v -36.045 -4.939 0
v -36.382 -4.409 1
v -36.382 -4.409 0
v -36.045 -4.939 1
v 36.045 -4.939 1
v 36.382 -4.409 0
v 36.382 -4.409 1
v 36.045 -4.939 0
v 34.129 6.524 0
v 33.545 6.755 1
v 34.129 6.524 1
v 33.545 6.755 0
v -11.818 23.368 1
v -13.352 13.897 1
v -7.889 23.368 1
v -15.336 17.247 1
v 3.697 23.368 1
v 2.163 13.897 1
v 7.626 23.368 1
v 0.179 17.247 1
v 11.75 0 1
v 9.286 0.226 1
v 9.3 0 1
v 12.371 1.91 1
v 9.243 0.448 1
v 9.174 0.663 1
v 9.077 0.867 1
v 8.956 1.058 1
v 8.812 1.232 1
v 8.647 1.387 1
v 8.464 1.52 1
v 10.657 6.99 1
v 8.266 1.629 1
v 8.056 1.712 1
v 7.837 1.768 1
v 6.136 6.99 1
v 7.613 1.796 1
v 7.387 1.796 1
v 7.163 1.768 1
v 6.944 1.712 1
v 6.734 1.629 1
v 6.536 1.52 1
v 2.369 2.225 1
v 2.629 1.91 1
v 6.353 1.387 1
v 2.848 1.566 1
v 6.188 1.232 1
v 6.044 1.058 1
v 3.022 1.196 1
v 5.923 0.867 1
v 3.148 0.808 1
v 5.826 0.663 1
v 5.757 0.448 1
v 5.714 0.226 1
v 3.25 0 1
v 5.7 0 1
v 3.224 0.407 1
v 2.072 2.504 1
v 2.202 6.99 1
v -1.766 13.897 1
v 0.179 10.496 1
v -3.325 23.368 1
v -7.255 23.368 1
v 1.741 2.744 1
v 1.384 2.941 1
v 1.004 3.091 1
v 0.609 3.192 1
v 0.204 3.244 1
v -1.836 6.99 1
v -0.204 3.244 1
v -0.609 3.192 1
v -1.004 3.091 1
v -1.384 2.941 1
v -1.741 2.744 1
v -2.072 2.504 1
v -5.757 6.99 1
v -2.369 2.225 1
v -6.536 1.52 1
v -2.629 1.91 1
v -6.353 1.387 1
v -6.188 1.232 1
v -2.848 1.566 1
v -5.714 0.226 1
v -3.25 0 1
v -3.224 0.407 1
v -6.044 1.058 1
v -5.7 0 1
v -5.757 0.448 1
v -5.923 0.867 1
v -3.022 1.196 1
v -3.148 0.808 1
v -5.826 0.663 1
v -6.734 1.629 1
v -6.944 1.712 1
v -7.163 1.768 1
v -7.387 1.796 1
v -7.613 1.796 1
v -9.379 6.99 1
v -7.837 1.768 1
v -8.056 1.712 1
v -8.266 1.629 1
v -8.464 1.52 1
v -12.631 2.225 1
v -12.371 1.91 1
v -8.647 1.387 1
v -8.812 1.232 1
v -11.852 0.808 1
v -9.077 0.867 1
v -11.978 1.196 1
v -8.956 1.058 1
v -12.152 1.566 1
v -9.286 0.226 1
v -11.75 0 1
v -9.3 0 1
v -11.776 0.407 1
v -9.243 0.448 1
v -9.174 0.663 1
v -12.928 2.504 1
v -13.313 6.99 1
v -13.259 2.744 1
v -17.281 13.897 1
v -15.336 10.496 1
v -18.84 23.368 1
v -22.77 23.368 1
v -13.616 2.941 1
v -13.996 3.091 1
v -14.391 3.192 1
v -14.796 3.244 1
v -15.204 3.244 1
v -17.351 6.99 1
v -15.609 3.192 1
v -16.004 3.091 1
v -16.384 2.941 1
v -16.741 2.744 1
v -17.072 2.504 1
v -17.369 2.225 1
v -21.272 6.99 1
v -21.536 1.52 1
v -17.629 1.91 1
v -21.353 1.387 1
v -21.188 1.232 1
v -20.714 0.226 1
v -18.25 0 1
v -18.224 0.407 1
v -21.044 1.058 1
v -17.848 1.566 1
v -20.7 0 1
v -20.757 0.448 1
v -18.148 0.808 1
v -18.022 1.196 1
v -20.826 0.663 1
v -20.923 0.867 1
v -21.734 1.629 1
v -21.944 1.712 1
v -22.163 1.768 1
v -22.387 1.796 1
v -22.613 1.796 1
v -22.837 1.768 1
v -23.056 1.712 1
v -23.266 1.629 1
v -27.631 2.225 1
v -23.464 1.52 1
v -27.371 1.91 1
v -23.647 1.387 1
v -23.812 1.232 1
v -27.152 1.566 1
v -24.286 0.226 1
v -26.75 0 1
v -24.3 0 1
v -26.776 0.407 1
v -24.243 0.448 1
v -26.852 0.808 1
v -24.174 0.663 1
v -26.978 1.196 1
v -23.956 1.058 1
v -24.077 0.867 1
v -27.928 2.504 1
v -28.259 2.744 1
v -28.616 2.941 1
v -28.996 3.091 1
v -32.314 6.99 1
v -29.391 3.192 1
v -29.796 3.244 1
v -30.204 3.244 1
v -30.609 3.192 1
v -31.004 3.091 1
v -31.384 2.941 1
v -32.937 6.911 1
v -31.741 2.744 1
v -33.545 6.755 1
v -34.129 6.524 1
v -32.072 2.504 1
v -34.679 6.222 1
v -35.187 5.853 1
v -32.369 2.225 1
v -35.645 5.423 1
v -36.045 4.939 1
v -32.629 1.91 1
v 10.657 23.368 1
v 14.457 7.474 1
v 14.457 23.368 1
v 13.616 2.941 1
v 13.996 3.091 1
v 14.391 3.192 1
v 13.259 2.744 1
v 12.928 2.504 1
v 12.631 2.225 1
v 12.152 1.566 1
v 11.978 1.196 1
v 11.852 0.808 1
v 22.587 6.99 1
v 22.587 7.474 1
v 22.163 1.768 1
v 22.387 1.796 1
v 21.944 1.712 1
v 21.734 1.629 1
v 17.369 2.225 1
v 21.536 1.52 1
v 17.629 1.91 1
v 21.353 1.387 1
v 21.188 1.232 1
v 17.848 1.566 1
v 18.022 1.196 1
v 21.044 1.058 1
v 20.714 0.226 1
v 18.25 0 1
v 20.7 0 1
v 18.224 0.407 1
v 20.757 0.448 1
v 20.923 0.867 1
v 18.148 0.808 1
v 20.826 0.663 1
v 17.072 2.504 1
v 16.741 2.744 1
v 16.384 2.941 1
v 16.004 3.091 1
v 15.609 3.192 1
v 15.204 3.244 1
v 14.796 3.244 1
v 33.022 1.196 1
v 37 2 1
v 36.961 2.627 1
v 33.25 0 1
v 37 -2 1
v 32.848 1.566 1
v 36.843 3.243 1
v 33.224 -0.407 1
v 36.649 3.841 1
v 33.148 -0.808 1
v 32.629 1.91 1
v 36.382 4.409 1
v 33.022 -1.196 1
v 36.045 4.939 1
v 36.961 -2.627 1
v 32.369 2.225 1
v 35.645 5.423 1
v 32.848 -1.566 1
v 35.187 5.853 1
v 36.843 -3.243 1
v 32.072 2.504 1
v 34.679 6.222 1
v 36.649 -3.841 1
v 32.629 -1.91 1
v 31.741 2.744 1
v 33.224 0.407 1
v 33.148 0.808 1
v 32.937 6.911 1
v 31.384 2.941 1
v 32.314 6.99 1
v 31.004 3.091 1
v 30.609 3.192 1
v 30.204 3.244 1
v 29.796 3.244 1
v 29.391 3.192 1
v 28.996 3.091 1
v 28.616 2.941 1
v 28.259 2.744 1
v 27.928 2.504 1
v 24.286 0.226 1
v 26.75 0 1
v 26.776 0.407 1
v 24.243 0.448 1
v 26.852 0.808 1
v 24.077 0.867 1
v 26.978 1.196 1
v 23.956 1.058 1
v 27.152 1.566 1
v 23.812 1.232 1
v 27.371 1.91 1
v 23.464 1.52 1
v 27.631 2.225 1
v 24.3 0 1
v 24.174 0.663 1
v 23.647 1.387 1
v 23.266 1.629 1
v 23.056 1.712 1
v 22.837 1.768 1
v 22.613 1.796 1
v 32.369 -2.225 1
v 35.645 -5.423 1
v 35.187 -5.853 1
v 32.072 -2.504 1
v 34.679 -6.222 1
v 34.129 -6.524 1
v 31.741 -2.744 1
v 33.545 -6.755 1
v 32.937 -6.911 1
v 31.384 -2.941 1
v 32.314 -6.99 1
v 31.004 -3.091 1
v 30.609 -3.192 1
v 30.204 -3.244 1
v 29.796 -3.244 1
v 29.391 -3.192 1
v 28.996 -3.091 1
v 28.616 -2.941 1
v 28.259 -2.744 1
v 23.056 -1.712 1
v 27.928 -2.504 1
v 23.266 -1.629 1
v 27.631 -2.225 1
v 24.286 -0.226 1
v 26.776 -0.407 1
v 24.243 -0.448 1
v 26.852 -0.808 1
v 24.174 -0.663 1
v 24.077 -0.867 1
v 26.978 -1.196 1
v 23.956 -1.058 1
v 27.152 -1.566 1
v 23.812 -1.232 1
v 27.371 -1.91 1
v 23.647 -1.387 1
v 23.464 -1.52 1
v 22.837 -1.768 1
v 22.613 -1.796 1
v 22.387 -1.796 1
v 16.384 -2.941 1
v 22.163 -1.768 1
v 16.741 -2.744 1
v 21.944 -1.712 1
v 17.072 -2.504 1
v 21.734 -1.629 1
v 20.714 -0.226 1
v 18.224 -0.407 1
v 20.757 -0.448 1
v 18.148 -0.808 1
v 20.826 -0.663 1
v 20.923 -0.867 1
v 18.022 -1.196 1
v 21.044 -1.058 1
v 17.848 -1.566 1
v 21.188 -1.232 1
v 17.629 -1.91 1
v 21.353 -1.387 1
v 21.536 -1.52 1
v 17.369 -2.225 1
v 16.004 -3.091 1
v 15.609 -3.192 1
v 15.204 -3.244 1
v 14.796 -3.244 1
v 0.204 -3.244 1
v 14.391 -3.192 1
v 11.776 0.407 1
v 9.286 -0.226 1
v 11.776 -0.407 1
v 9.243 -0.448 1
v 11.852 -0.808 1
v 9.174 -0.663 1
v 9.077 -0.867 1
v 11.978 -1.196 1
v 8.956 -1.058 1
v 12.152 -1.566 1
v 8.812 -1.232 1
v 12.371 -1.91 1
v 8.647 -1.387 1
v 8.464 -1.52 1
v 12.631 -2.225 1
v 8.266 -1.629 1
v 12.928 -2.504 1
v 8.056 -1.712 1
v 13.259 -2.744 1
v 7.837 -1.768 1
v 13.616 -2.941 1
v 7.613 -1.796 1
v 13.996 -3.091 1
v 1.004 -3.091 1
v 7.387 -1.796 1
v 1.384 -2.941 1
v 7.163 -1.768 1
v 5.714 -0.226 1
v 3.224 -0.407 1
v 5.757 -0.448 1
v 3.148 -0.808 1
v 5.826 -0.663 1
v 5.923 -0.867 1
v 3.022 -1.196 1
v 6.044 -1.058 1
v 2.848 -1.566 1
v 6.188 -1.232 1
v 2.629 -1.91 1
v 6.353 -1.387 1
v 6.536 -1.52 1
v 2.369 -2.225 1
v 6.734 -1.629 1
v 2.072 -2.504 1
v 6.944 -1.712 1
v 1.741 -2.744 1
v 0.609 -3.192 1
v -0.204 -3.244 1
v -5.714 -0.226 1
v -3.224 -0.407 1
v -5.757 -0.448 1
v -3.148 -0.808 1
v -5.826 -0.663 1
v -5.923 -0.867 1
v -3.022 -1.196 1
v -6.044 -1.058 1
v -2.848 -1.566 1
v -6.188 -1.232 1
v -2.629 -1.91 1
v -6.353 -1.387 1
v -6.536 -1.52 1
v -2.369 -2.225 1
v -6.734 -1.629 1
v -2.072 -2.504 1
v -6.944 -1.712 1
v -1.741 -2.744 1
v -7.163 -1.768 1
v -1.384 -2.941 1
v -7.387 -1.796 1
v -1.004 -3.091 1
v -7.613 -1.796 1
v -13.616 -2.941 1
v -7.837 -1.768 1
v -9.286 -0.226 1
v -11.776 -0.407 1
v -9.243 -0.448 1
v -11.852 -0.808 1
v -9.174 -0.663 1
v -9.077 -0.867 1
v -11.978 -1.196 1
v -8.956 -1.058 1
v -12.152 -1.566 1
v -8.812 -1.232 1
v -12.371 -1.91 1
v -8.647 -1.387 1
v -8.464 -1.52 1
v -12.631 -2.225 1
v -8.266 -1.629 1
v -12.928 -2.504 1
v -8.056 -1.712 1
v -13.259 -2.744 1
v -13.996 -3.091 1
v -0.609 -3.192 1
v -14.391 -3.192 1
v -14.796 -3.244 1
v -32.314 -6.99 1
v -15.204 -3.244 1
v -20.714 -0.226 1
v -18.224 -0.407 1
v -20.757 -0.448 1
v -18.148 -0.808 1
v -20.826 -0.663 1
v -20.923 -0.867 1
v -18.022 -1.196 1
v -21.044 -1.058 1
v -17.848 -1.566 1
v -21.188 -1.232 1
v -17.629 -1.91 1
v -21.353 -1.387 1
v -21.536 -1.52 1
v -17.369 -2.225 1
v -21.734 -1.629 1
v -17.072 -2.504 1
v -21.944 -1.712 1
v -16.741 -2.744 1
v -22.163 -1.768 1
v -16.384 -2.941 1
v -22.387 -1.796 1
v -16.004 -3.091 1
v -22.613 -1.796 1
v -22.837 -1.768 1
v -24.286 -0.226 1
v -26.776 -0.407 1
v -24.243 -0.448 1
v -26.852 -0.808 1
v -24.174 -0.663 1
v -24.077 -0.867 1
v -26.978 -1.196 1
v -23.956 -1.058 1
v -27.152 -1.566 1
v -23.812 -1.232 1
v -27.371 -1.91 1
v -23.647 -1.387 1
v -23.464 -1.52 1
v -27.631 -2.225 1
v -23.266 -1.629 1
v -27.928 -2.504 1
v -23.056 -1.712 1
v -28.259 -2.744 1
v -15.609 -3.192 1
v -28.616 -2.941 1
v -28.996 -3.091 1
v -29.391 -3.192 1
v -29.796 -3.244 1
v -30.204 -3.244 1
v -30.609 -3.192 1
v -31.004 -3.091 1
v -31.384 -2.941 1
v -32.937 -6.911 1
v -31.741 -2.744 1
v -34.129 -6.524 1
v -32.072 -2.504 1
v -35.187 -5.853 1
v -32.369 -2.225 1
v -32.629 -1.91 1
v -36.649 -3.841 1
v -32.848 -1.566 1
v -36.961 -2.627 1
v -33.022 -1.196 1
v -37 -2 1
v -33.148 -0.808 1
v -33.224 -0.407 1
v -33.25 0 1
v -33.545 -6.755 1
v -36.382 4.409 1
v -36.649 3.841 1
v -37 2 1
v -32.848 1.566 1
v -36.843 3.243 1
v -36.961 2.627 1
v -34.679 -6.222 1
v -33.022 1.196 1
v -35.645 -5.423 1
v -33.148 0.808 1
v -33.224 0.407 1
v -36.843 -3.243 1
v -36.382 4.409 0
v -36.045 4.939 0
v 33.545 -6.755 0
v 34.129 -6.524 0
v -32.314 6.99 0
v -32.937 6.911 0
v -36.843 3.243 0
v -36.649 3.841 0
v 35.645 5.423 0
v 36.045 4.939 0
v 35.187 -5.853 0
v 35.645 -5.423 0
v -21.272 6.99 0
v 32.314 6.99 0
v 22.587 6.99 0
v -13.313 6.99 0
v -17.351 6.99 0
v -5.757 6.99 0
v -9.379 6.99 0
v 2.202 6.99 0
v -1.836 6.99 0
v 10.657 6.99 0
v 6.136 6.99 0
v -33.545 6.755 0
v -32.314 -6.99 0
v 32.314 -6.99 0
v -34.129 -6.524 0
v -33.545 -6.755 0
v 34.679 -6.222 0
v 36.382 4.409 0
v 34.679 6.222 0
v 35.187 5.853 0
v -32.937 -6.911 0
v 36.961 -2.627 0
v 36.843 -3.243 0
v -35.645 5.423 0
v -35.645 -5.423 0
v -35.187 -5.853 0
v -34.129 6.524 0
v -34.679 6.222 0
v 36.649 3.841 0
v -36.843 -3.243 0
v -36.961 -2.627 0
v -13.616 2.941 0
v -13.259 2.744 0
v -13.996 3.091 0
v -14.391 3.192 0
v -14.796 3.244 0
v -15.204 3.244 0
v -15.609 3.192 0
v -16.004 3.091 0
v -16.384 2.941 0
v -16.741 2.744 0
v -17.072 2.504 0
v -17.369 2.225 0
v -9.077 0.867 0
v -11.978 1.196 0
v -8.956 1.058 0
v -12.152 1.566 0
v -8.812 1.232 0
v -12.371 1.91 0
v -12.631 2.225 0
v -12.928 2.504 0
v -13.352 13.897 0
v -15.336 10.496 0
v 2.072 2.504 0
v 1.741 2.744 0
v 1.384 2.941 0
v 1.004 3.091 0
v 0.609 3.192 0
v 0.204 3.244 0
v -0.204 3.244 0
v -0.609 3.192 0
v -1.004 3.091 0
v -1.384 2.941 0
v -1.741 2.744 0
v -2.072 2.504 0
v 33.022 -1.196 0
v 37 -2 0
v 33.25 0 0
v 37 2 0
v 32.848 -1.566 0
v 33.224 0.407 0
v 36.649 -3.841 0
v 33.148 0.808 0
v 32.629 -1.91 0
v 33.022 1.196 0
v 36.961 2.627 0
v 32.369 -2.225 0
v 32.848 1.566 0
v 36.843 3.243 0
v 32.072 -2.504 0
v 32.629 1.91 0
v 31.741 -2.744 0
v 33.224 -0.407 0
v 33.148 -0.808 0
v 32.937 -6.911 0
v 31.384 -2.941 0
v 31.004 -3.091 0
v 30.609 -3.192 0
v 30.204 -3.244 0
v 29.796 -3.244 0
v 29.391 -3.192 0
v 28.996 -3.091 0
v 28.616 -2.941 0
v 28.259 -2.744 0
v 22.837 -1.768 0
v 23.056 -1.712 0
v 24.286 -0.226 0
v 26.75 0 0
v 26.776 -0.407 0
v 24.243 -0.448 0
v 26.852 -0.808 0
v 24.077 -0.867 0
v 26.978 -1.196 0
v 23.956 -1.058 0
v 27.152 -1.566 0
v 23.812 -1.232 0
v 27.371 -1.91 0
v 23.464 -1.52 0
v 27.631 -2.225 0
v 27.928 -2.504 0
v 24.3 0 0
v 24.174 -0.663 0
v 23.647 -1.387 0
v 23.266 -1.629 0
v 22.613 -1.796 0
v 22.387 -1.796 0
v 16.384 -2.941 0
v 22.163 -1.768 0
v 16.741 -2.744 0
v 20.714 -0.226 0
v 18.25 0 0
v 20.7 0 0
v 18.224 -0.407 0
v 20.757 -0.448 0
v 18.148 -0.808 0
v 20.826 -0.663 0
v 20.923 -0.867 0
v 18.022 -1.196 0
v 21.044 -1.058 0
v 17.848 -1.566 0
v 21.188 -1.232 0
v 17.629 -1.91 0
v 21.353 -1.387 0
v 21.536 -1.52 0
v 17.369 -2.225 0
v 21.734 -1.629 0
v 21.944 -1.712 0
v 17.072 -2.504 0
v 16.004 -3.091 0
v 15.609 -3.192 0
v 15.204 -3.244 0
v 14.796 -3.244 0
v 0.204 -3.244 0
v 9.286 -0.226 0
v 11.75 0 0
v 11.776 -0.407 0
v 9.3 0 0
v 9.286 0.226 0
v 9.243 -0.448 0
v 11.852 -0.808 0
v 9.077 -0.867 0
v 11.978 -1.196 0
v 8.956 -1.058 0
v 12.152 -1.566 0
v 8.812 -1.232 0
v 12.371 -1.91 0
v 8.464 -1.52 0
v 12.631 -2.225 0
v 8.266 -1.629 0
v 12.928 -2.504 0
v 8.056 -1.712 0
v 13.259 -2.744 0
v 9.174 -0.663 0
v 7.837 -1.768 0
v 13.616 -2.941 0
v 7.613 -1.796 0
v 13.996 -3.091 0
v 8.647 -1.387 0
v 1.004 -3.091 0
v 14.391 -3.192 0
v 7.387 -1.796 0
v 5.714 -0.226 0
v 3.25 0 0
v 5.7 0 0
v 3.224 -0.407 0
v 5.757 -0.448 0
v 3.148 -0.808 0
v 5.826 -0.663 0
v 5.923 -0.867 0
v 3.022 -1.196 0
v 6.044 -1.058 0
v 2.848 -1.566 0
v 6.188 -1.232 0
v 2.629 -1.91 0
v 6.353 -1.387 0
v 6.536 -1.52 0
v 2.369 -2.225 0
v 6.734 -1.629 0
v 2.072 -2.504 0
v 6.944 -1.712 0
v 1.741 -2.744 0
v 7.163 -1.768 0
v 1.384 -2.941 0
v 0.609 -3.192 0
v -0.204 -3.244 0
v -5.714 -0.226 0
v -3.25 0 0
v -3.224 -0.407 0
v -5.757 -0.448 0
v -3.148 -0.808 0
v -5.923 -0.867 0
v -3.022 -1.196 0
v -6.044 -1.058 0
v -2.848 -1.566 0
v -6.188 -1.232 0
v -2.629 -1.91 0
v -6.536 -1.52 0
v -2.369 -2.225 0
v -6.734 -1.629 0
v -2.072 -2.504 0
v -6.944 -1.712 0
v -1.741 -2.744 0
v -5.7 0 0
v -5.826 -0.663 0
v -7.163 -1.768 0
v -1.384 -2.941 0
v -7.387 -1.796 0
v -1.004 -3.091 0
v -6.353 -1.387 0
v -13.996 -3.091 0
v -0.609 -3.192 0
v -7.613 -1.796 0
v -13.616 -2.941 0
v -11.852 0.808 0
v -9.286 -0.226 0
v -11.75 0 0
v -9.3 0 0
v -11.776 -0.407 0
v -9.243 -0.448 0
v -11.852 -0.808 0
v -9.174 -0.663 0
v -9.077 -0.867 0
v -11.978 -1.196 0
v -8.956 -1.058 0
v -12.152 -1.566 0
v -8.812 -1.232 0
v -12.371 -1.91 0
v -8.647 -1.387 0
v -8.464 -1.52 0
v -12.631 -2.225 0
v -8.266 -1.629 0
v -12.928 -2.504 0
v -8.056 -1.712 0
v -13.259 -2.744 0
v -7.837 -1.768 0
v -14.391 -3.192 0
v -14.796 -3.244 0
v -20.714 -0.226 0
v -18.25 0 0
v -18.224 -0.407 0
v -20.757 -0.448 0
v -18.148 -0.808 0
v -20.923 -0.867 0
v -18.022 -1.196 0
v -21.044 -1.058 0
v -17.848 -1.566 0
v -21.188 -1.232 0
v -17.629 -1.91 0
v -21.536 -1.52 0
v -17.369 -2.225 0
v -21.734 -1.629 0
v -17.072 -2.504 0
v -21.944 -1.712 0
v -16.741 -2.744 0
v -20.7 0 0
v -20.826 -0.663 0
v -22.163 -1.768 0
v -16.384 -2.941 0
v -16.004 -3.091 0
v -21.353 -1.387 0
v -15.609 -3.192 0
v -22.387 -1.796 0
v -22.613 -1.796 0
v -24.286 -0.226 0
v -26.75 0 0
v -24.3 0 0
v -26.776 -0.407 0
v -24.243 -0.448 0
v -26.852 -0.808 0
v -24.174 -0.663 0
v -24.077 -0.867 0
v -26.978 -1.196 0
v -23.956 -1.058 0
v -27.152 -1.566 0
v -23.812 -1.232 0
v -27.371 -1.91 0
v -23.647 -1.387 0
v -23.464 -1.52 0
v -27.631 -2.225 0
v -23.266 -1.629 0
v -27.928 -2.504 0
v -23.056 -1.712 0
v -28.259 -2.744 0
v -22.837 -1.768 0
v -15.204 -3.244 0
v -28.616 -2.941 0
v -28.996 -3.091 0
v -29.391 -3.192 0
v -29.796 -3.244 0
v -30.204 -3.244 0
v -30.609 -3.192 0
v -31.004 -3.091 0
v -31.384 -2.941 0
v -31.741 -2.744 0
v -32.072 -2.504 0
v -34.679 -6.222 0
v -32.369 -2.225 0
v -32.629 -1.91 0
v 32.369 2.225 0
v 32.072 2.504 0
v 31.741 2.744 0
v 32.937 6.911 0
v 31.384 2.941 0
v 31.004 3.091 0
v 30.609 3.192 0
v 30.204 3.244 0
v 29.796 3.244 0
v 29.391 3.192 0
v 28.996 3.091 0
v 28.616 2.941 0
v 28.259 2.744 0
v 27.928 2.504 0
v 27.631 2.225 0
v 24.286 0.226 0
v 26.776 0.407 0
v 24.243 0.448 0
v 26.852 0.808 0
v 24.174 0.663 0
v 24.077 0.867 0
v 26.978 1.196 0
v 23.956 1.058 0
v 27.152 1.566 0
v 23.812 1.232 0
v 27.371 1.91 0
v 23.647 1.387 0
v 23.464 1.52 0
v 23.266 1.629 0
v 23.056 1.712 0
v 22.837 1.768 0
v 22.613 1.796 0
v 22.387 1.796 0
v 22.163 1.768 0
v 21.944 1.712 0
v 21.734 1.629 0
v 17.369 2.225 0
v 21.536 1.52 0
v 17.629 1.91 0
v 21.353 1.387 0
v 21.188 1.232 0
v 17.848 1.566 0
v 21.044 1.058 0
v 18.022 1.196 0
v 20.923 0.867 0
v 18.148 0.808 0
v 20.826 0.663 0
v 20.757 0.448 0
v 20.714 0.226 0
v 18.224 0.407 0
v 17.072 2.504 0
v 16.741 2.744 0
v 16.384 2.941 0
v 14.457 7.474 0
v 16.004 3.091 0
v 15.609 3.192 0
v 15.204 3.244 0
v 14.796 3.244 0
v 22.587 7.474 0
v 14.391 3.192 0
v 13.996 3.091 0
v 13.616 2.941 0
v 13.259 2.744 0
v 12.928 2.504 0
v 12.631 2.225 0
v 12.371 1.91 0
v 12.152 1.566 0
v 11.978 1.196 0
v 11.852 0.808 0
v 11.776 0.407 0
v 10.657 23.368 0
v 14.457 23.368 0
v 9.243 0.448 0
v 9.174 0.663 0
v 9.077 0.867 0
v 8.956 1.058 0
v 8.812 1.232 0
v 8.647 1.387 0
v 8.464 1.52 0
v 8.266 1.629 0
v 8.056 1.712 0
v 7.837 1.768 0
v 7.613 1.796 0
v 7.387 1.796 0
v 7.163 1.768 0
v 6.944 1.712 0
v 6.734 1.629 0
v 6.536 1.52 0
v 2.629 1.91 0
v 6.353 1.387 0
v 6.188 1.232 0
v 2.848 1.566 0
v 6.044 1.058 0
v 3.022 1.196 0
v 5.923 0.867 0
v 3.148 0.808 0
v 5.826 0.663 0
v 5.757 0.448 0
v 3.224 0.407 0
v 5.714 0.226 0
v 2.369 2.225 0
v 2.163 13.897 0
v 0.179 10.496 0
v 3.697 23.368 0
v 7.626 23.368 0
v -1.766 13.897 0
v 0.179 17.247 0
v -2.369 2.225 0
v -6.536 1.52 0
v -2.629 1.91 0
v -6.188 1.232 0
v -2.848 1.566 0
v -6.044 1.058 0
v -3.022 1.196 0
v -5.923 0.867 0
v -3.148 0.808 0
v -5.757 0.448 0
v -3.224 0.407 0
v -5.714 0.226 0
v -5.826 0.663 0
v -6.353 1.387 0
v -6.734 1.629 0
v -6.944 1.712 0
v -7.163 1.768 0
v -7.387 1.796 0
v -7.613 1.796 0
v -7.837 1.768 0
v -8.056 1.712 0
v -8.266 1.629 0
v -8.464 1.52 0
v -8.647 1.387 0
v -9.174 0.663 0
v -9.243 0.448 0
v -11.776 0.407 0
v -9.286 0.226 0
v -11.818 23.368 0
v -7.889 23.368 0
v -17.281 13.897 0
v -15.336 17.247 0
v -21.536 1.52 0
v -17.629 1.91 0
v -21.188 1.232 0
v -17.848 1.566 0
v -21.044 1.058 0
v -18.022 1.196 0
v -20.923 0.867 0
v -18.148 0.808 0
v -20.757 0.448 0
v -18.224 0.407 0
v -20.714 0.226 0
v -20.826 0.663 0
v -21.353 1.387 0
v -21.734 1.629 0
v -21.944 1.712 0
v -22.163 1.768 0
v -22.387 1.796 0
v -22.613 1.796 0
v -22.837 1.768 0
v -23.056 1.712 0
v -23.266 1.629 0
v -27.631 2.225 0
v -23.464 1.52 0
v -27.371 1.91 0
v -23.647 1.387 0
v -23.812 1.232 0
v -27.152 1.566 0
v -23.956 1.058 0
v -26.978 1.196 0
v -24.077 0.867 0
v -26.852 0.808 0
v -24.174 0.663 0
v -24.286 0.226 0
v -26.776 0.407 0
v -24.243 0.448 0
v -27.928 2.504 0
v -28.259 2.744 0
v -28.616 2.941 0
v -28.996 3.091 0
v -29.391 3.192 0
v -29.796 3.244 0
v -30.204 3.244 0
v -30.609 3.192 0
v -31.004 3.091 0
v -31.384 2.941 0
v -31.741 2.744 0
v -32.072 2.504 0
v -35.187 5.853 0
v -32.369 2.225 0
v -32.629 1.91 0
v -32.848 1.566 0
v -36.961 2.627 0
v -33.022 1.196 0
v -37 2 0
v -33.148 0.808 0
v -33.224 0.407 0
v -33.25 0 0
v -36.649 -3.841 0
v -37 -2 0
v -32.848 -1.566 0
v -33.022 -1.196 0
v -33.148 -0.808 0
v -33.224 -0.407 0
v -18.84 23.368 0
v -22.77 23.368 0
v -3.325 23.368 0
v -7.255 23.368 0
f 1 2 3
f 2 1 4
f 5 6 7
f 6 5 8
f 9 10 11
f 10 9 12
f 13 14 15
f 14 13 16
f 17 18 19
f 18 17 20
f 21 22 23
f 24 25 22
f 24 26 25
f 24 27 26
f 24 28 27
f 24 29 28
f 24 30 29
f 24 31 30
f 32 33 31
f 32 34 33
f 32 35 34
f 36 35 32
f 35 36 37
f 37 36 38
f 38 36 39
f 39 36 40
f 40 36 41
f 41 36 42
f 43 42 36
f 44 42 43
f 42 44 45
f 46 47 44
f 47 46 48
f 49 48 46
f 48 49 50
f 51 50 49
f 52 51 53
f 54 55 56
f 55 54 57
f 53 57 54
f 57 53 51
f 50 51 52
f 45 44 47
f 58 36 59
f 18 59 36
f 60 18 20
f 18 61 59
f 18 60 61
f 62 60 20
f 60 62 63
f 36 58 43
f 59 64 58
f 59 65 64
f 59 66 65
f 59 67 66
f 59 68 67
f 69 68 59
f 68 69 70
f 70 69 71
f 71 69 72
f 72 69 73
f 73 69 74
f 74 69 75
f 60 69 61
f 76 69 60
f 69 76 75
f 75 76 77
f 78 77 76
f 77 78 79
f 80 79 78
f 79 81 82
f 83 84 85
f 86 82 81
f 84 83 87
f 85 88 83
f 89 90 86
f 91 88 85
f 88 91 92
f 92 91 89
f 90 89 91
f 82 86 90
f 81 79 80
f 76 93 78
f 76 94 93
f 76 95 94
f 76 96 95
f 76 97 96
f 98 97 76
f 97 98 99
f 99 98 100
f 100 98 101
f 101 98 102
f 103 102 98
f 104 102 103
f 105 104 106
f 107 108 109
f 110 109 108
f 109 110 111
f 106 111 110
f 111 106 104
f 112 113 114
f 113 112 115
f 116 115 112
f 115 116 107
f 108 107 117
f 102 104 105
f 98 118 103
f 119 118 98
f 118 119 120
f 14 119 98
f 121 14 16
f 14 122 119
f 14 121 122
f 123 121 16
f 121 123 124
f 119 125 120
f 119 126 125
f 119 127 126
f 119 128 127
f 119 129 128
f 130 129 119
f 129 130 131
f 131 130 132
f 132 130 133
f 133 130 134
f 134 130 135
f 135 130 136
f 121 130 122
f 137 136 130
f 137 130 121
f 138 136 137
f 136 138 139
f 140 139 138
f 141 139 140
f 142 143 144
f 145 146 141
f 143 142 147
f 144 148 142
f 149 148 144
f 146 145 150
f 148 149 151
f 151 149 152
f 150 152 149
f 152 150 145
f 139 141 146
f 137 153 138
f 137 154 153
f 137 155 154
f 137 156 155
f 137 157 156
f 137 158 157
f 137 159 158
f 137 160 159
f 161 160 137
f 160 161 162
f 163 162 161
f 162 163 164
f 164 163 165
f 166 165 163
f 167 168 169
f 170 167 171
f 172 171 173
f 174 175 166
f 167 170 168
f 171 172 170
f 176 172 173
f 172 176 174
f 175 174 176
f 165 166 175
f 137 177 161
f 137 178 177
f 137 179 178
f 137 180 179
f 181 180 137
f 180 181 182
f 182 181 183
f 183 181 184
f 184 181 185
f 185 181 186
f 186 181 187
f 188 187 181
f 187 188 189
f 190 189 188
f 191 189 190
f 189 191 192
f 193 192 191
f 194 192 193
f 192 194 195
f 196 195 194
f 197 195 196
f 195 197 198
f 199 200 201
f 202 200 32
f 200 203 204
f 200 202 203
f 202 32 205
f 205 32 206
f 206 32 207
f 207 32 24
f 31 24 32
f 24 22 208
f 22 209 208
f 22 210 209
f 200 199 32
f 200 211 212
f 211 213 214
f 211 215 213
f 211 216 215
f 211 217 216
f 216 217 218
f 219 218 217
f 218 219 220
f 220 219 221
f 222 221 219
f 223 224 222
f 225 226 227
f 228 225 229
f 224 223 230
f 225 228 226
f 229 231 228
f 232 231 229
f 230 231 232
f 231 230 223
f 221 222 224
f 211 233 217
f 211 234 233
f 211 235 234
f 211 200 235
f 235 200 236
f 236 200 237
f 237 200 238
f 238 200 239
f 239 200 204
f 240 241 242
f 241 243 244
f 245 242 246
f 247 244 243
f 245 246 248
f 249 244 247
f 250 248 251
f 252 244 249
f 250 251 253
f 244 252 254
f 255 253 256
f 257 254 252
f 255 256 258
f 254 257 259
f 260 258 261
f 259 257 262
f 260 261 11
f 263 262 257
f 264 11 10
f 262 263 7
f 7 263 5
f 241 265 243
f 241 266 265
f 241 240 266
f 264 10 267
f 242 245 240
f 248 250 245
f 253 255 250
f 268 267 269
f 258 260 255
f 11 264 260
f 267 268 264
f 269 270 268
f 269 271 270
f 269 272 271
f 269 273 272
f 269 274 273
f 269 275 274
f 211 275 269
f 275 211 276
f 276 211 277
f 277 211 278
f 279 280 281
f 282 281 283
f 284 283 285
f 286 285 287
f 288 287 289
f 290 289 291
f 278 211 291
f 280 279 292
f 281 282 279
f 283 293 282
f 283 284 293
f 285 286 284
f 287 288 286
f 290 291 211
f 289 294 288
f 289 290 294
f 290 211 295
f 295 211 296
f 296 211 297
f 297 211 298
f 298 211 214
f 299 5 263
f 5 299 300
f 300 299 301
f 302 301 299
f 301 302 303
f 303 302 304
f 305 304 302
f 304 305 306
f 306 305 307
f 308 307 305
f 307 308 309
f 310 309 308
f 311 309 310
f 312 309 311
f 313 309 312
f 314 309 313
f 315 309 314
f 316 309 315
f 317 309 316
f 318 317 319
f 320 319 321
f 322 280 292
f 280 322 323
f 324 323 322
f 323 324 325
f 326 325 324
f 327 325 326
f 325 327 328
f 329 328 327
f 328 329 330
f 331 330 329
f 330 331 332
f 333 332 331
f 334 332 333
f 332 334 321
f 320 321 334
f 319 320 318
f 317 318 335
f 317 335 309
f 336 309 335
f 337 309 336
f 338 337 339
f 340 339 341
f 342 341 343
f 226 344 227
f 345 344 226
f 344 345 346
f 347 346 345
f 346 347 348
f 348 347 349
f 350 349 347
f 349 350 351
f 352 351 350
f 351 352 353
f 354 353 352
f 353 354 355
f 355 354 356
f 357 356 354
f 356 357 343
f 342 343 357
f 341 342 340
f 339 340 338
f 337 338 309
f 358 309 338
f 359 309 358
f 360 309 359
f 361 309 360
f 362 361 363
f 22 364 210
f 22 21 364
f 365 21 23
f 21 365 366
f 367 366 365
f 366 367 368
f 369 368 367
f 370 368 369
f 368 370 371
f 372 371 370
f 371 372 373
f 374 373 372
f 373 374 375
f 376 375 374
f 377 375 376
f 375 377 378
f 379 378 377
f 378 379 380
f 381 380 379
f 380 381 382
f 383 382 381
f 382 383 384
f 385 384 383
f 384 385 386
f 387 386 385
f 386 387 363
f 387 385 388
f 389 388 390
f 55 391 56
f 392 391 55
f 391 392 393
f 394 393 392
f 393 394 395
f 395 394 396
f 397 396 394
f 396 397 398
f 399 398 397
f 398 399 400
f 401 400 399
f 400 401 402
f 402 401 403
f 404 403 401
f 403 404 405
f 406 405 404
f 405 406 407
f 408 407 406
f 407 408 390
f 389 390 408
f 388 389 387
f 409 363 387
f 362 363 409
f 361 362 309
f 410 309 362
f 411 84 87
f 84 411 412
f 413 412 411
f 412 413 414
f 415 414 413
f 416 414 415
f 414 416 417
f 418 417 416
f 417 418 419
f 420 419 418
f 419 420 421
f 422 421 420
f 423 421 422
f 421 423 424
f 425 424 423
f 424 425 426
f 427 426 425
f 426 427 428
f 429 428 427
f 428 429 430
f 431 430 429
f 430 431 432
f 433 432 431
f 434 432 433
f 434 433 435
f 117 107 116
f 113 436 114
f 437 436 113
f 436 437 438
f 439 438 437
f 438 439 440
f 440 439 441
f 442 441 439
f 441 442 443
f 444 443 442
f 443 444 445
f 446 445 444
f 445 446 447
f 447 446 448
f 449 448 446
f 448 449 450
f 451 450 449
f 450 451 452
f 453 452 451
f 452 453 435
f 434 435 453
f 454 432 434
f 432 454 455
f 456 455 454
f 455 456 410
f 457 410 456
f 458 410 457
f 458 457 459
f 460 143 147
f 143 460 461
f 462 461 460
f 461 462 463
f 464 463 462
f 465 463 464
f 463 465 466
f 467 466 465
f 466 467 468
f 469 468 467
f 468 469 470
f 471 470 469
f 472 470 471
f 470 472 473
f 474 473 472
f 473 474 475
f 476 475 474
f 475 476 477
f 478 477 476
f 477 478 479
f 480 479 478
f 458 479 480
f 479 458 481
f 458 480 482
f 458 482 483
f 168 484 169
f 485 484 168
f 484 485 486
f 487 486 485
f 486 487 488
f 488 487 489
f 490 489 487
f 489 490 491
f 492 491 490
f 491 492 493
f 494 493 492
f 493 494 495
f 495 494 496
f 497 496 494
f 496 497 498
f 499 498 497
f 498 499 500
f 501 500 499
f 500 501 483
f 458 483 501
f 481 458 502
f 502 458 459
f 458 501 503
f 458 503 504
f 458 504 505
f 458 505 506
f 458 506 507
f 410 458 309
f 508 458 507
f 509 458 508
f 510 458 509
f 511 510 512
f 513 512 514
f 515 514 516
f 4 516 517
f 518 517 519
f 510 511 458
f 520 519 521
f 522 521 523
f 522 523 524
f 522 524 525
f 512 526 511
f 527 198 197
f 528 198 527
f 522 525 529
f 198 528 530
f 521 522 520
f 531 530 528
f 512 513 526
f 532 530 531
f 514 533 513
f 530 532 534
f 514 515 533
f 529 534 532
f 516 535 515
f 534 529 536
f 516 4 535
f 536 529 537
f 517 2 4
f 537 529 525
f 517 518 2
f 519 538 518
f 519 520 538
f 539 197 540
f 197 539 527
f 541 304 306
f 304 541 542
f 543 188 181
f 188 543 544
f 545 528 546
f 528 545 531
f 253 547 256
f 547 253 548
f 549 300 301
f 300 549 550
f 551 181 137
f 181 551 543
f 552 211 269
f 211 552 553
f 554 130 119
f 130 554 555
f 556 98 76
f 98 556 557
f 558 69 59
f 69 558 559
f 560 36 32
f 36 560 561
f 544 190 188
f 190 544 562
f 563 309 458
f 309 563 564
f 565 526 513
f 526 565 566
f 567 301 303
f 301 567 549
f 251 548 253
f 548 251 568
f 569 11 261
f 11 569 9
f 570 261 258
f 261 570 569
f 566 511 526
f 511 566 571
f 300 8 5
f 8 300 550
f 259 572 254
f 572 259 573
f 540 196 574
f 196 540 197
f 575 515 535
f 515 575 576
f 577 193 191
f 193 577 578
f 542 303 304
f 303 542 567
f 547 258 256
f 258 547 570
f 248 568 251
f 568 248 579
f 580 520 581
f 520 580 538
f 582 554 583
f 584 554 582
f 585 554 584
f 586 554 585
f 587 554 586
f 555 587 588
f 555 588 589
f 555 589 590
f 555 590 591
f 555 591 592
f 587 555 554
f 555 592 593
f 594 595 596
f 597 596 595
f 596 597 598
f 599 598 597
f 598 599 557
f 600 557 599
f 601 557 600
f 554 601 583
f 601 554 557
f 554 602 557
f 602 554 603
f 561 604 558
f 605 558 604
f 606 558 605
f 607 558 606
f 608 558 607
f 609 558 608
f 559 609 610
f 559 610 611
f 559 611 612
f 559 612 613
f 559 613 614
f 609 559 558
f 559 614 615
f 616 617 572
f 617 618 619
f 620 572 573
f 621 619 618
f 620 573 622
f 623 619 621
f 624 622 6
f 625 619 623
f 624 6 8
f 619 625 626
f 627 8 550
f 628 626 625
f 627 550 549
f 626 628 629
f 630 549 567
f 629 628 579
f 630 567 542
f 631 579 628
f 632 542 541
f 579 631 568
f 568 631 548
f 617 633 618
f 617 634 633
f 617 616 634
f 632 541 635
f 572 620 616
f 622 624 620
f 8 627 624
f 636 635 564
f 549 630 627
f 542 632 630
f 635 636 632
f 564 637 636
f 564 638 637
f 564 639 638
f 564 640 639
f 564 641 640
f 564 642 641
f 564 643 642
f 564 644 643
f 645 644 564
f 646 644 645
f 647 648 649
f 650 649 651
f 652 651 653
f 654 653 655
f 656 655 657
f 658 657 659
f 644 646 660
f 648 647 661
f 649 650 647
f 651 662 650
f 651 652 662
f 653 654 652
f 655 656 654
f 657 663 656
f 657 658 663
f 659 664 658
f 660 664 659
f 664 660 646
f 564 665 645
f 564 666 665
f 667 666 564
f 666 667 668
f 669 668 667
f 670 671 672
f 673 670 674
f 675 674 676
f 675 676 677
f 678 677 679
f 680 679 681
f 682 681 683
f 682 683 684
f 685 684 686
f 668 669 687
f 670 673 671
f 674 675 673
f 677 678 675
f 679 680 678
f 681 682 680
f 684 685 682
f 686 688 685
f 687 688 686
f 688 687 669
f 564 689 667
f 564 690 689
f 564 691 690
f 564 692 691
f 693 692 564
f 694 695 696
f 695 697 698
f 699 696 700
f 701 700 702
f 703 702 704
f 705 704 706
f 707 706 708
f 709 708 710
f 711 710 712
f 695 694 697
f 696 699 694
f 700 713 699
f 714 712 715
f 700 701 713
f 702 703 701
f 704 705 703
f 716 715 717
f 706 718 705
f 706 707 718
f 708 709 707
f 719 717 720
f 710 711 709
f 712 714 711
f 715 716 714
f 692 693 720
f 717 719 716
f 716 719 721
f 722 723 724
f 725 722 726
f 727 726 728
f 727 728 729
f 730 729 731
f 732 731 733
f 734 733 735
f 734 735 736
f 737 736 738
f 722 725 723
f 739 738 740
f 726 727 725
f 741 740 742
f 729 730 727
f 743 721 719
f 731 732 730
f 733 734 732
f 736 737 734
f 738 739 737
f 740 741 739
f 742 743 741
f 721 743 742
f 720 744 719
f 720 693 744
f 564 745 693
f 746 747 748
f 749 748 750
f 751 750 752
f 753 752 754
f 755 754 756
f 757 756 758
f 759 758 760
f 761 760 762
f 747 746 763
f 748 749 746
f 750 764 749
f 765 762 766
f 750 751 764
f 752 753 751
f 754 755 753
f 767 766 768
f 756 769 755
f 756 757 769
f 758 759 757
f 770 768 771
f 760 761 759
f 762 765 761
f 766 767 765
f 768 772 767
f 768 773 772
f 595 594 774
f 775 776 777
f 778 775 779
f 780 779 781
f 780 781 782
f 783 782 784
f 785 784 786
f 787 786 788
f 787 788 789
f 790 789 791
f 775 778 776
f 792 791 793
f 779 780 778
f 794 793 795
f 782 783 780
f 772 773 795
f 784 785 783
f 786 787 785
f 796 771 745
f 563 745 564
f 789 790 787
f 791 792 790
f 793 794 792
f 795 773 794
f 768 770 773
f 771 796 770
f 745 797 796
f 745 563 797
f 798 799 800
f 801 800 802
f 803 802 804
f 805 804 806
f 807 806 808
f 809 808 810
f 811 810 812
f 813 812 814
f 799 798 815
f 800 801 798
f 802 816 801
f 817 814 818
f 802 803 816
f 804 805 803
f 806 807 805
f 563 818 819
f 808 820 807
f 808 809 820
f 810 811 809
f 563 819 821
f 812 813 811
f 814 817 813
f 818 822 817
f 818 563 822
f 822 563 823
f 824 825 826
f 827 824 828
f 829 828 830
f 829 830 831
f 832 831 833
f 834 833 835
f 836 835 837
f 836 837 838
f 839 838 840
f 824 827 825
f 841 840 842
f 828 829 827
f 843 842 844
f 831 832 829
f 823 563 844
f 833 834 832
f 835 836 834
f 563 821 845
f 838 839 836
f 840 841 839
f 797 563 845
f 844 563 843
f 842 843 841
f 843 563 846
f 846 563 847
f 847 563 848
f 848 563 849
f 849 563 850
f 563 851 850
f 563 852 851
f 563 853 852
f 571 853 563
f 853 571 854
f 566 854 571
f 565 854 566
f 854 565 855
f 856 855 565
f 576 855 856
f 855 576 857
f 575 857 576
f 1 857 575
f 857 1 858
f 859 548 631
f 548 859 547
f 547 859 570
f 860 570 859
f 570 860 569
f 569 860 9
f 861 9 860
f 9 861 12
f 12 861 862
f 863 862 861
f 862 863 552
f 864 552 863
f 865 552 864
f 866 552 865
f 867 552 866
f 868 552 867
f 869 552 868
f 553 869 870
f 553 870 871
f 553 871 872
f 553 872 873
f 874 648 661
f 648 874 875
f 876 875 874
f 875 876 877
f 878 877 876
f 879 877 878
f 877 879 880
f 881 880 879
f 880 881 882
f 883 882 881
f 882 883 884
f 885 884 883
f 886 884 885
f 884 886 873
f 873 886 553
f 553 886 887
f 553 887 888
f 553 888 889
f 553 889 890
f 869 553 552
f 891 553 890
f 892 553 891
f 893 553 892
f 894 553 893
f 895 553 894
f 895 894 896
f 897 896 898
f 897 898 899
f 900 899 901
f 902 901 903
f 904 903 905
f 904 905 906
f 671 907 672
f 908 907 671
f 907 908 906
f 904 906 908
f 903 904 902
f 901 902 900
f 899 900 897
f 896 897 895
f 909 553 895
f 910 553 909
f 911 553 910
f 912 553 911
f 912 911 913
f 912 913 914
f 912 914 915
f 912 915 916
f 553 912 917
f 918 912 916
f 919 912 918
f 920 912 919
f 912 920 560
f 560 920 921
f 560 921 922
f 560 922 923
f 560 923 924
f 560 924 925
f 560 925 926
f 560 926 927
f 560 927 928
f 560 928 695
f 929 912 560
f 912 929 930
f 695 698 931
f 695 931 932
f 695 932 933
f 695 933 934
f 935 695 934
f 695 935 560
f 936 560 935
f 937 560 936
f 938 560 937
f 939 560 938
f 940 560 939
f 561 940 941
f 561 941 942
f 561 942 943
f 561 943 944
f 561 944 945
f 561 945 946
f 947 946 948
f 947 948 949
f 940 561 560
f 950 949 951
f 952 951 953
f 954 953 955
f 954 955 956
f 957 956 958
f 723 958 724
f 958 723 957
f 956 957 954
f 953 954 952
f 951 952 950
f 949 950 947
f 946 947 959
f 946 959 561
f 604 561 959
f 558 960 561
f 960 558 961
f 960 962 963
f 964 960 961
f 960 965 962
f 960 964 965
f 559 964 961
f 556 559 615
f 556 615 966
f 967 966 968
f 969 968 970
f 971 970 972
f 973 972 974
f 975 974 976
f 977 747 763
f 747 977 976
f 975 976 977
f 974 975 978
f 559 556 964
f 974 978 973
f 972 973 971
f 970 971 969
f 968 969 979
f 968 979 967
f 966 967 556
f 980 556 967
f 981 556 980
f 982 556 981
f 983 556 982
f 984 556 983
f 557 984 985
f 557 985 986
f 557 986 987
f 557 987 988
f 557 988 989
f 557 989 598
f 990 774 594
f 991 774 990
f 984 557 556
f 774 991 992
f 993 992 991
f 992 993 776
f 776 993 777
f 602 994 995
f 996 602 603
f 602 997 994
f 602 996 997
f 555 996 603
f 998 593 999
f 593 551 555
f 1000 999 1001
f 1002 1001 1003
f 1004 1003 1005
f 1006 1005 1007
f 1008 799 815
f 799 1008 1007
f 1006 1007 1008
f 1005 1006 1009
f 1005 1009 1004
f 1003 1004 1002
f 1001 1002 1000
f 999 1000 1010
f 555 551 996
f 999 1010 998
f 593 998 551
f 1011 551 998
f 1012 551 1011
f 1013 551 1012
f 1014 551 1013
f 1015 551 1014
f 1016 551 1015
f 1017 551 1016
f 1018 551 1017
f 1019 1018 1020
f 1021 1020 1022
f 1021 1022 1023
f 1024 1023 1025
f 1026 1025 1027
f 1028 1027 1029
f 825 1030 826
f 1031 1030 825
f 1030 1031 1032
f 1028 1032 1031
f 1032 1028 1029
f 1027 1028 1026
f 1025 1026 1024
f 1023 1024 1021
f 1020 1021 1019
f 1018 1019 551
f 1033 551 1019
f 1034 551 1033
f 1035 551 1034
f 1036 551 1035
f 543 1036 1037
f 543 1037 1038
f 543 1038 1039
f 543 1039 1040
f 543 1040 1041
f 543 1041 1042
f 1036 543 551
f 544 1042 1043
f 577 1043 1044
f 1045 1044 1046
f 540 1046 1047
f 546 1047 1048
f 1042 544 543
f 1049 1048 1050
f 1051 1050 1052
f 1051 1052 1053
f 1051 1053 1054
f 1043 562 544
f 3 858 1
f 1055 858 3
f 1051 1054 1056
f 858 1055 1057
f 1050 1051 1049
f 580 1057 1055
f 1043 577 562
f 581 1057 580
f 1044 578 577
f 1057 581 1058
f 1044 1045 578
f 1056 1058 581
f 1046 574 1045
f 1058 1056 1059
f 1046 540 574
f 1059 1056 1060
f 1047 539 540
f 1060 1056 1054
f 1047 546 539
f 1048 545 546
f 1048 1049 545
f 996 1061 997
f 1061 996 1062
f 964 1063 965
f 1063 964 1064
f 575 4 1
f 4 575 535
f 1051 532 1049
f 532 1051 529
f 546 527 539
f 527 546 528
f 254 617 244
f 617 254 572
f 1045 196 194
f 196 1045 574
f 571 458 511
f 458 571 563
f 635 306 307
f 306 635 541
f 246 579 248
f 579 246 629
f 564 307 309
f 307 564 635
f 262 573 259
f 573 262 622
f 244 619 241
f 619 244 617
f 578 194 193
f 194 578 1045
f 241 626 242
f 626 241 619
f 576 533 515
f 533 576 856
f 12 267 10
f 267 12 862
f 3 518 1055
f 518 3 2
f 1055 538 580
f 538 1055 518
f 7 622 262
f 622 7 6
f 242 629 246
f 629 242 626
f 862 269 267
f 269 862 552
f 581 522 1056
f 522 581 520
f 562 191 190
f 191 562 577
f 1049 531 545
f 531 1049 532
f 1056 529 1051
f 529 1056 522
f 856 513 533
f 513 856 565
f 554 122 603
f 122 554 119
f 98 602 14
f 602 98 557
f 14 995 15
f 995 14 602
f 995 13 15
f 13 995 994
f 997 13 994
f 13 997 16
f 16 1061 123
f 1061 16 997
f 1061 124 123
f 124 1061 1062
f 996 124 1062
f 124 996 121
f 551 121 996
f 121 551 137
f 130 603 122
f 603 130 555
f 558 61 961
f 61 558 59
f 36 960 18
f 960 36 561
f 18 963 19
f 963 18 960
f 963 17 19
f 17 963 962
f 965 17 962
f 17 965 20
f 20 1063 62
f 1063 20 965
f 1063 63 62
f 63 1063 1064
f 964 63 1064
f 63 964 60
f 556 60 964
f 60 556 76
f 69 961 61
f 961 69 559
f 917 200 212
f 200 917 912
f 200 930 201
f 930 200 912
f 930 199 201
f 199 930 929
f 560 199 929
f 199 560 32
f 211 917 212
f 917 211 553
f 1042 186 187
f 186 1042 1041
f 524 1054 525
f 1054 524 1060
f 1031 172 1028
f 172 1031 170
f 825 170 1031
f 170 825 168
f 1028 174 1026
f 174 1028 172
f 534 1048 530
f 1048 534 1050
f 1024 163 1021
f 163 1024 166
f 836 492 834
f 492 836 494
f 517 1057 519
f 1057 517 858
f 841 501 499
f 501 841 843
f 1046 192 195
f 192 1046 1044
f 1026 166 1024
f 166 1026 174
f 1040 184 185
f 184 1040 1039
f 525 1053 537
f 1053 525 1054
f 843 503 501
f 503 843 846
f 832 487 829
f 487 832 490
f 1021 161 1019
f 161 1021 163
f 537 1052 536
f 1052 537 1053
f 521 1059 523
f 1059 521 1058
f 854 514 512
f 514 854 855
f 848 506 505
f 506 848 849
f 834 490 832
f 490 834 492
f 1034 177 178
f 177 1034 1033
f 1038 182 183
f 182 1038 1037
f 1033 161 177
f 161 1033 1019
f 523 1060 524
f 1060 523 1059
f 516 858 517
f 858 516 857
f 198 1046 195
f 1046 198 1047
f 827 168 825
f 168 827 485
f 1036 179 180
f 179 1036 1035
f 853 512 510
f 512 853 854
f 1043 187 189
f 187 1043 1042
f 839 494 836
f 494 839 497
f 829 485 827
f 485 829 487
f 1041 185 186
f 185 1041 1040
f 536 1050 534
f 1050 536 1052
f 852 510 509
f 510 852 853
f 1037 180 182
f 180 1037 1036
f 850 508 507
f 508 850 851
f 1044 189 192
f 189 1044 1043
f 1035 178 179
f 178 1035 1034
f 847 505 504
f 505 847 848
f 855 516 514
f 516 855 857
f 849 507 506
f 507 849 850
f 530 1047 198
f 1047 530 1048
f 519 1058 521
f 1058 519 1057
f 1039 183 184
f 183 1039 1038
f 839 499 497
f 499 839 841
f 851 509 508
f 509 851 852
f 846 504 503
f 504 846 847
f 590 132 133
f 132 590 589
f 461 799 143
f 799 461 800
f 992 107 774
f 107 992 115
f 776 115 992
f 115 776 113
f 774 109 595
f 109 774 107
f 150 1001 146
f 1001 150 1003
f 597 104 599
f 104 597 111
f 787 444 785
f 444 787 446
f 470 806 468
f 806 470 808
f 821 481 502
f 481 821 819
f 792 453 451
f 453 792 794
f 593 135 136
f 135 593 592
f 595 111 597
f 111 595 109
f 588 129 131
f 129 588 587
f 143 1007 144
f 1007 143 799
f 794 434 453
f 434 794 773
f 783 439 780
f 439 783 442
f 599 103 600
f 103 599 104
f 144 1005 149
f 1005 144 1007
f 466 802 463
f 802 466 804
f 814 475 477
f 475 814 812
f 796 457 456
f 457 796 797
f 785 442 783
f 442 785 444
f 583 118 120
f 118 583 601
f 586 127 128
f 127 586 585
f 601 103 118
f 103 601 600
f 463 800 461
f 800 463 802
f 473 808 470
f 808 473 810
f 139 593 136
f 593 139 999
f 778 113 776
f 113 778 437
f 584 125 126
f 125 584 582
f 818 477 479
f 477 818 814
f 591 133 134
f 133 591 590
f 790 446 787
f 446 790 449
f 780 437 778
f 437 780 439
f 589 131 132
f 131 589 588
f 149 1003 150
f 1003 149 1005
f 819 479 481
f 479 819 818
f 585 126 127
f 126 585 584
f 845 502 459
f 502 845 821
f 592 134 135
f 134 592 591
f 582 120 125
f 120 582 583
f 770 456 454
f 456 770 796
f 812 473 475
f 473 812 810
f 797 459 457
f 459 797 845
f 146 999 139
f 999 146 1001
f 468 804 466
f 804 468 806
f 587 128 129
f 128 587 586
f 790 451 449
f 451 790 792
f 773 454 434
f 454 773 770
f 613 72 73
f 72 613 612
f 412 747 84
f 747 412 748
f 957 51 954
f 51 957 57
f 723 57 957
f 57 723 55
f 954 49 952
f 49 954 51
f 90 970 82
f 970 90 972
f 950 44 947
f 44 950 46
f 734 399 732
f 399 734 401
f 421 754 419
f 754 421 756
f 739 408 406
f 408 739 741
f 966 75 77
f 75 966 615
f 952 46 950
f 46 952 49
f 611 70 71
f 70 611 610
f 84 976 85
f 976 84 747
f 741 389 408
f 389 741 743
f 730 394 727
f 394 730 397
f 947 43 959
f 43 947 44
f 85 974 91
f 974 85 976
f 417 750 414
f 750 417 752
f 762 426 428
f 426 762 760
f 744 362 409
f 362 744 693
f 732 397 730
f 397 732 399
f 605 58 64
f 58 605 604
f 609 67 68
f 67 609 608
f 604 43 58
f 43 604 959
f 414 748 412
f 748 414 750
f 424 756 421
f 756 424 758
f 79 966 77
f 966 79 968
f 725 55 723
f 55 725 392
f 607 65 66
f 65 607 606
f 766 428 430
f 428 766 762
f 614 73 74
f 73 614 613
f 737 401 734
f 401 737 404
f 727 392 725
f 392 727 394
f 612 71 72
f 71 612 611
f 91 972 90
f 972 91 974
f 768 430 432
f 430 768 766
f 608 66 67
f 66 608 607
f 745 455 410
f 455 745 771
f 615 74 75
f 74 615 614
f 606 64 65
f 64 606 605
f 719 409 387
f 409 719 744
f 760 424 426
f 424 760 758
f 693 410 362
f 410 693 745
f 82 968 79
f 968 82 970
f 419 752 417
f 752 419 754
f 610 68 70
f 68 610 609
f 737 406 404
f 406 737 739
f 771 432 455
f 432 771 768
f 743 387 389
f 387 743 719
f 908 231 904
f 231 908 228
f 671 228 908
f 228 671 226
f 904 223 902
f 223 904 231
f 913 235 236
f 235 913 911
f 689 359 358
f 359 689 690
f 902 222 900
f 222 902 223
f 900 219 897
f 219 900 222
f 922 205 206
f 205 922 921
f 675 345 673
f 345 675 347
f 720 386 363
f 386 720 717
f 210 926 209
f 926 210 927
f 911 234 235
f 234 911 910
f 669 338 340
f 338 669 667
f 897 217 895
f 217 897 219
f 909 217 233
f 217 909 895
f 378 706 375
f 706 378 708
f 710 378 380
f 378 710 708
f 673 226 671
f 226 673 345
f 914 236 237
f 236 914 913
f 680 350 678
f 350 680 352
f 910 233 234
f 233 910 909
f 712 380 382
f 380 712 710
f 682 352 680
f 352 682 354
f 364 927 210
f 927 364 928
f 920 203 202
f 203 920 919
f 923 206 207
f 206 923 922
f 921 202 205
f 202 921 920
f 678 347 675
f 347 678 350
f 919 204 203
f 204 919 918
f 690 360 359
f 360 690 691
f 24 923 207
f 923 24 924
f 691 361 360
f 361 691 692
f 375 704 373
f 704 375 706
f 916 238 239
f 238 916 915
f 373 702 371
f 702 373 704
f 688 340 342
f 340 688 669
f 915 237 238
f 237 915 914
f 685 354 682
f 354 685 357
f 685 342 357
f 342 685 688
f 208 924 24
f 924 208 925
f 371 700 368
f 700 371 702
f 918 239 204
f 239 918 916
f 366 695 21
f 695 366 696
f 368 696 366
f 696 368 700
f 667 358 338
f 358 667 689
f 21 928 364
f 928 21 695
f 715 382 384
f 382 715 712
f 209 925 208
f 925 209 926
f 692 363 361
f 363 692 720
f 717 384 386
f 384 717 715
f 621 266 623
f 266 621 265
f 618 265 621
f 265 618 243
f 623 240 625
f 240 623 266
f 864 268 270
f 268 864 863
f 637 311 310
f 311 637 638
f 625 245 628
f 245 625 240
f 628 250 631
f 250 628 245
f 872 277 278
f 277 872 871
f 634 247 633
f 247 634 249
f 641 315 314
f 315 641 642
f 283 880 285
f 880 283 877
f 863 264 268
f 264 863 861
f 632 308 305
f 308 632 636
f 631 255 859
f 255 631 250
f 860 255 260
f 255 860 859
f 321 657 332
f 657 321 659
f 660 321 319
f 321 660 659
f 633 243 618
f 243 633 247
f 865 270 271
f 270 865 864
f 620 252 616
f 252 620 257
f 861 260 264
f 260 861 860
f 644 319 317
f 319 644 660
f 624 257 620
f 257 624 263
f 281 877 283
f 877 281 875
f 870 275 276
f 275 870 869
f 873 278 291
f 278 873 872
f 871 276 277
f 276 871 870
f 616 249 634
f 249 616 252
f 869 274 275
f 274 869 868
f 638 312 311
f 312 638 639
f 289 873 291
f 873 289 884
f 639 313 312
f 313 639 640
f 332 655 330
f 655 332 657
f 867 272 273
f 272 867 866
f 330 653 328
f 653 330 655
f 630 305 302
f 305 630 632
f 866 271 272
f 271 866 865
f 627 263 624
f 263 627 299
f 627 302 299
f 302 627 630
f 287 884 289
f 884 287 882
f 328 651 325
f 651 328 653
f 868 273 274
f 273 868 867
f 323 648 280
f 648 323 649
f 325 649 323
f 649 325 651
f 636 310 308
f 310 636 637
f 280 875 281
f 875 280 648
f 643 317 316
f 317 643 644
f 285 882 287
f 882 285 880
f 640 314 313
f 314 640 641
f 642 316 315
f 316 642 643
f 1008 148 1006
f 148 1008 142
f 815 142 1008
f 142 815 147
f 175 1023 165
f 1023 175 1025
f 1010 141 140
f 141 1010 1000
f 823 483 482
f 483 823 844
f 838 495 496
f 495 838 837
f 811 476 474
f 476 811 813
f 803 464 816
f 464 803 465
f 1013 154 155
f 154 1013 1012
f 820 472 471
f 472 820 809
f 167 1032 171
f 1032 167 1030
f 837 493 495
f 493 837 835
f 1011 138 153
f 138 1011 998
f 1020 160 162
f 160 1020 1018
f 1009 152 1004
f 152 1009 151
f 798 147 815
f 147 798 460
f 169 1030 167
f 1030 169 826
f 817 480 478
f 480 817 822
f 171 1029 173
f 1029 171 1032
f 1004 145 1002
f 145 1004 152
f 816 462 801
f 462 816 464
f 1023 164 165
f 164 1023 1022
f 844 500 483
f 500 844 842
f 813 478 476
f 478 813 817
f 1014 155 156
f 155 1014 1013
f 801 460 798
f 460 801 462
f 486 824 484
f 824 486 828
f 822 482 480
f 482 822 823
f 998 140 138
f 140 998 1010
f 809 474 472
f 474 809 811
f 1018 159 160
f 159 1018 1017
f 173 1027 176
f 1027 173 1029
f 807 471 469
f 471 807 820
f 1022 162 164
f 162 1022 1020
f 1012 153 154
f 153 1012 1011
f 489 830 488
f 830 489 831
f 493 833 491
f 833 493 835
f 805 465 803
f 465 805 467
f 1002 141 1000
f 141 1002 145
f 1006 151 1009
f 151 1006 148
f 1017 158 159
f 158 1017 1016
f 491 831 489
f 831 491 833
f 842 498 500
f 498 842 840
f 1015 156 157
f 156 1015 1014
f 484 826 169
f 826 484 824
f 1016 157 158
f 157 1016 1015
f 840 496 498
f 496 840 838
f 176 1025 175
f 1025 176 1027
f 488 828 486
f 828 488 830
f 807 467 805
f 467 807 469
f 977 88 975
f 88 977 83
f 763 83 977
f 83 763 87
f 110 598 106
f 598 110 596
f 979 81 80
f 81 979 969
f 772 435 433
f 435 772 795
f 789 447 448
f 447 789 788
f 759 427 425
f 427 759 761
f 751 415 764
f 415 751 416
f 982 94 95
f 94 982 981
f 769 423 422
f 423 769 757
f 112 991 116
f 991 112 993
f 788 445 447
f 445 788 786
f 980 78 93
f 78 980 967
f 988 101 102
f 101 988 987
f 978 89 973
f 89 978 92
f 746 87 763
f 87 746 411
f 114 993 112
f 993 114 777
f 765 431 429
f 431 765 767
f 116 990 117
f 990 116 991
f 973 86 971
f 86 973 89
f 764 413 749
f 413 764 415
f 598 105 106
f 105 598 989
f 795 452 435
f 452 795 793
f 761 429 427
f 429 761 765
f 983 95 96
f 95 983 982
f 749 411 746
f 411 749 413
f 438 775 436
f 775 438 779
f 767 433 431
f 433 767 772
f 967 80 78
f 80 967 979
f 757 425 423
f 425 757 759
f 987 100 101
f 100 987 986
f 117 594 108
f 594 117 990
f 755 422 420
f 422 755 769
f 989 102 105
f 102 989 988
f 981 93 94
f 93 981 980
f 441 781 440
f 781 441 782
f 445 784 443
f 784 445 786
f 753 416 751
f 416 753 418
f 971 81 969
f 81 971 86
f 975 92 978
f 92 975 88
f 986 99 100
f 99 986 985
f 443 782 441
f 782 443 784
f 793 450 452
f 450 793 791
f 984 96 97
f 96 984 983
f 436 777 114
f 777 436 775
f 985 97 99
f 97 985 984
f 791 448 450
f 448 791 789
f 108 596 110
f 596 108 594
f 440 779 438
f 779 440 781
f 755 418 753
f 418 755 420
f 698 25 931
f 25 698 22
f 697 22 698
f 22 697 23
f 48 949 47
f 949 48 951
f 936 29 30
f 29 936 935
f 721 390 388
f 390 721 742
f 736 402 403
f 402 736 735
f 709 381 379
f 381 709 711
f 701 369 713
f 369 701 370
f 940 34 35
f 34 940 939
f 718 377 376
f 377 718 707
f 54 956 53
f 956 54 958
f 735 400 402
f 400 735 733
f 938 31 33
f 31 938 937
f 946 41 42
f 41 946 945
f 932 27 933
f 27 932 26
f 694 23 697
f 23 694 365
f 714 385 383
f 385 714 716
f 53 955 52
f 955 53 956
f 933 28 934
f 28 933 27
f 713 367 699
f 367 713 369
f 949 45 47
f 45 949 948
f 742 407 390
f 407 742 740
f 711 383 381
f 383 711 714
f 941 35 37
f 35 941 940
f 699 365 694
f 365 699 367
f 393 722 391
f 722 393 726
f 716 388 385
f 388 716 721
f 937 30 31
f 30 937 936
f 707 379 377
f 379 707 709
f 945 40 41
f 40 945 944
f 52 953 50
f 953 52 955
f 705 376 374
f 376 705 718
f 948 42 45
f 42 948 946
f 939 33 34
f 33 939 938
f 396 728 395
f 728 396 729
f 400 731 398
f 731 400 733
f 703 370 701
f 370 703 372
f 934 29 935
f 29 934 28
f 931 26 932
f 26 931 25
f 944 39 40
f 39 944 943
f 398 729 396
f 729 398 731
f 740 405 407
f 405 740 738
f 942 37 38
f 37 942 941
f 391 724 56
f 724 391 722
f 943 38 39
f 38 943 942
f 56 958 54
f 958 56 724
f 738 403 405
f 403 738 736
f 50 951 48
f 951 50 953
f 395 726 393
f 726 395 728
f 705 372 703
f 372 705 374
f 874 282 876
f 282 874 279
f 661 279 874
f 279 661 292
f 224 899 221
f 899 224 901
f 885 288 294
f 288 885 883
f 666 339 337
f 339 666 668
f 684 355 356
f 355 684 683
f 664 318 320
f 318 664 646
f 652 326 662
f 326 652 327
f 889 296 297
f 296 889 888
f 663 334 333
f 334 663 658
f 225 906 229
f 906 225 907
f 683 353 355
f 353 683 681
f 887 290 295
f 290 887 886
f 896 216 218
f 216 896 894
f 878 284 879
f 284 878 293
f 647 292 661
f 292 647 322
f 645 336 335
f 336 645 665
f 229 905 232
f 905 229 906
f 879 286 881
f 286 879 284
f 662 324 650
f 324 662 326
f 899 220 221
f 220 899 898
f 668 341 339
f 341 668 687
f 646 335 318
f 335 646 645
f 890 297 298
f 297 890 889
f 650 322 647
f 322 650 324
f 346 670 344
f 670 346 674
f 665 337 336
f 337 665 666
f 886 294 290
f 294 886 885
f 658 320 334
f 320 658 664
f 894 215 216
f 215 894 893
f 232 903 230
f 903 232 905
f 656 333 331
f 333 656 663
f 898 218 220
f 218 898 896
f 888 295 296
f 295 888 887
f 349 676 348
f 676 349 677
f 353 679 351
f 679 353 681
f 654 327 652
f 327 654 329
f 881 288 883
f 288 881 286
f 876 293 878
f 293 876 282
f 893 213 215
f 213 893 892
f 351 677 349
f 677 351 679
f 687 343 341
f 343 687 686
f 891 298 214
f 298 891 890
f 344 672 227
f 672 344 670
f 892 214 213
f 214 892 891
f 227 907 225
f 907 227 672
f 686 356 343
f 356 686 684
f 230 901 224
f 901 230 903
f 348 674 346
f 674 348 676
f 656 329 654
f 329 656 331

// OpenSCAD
$fn = 50;


difference() {
	union() {
		hull() {
			translate(v = [-32.0000000000, 2.0000000000, 0]) {
				cylinder(h = 1, r = 5);
			}
			translate(v = [32.0000000000, 2.0000000000, 0]) {
				cylinder(h = 1, r = 5);
			}
			translate(v = [-32.0000000000, -2.0000000000, 0]) {
				cylinder(h = 1, r = 5);
			}
			translate(v = [32.0000000000, -2.0000000000, 0]) {
				cylinder(h = 1, r = 5);
			}
		}
		translate(v = [0, 22.9166666667, 0]) {
			linear_extrude(height = 1) {
				text(font = "DejaVu Sans Mono:style=Bold", halign = "center", size = 19.0000000000, text = "XXL", valign = "top");
			}
		}
	}
	union() {
		translate(v = [-30.0000000000, 0.0000000000, 0]) {
			translate(v = [0, 0, -100]) {
				cylinder(h = 200, r = 3.2500000000);
			}
		}
		translate(v = [-15.0000000000, 0.0000000000, 0]) {
			translate(v = [0, 0, -100]) {
				cylinder(h = 200, r = 3.2500000000);
			}
		}
		translate(v = [0, 0, -100]) {
			cylinder(h = 200, r = 3.2500000000);
		}
		translate(v = [15.0000000000, 0.0000000000, 0]) {
			translate(v = [0, 0, -100]) {
				cylinder(h = 200, r = 3.2500000000);
			}
		}
		translate(v = [30.0000000000, 0.0000000000, 0]) {
			translate(v = [0, 0, -100]) {
				cylinder(h = 200, r = 3.2500000000);
			}
		}
		translate(v = [-30.0000000000, 0.0000000000, 0]) {
			translate(v = [0, 0, -100]) {
				cylinder(h = 200, r = 1.8000000000);
			}
		}
		translate(v = [-22.5000000000, 0.0000000000, 0]) {
			translate(v = [0, 0, -100]) {
				cylinder(h = 200, r = 1.8000000000);
			}
		}
		translate(v = [-15.0000000000, 0.0000000000, 0]) {
			translate(v = [0, 0, -100]) {
				cylinder(h = 200, r = 1.8000000000);
			}
		}
		translate(v = [-7.5000000000, 0.0000000000, 0]) {
			translate(v = [0, 0, -100]) {
				cylinder(h = 200, r = 1.8000000000);
			}
		}
		translate(v = [0, 0, -100]) {
			cylinder(h = 200, r = 1.8000000000);
		}
		translate(v = [7.5000000000, 0.0000000000, 0]) {
			translate(v = [0, 0, -100]) {
				cylinder(h = 200, r = 1.8000000000);
			}
		}
		translate(v = [15.0000000000, 0.0000000000, 0]) {
			translate(v = [0, 0, -100]) {
				cylinder(h = 200, r = 1.8000000000);
			}
		}
		translate(v = [22.5000000000, 0.0000000000, 0]) {
			translate(v = [0, 0, -100]) {
				cylinder(h = 200, r = 1.8000000000);
			}
		}
		translate(v = [30.0000000000, 0.0000000000, 0]) {
			translate(v = [0, 0, -100]) {
				cylinder(h = 200, r = 1.8000000000);
			}
		}
	}
}
